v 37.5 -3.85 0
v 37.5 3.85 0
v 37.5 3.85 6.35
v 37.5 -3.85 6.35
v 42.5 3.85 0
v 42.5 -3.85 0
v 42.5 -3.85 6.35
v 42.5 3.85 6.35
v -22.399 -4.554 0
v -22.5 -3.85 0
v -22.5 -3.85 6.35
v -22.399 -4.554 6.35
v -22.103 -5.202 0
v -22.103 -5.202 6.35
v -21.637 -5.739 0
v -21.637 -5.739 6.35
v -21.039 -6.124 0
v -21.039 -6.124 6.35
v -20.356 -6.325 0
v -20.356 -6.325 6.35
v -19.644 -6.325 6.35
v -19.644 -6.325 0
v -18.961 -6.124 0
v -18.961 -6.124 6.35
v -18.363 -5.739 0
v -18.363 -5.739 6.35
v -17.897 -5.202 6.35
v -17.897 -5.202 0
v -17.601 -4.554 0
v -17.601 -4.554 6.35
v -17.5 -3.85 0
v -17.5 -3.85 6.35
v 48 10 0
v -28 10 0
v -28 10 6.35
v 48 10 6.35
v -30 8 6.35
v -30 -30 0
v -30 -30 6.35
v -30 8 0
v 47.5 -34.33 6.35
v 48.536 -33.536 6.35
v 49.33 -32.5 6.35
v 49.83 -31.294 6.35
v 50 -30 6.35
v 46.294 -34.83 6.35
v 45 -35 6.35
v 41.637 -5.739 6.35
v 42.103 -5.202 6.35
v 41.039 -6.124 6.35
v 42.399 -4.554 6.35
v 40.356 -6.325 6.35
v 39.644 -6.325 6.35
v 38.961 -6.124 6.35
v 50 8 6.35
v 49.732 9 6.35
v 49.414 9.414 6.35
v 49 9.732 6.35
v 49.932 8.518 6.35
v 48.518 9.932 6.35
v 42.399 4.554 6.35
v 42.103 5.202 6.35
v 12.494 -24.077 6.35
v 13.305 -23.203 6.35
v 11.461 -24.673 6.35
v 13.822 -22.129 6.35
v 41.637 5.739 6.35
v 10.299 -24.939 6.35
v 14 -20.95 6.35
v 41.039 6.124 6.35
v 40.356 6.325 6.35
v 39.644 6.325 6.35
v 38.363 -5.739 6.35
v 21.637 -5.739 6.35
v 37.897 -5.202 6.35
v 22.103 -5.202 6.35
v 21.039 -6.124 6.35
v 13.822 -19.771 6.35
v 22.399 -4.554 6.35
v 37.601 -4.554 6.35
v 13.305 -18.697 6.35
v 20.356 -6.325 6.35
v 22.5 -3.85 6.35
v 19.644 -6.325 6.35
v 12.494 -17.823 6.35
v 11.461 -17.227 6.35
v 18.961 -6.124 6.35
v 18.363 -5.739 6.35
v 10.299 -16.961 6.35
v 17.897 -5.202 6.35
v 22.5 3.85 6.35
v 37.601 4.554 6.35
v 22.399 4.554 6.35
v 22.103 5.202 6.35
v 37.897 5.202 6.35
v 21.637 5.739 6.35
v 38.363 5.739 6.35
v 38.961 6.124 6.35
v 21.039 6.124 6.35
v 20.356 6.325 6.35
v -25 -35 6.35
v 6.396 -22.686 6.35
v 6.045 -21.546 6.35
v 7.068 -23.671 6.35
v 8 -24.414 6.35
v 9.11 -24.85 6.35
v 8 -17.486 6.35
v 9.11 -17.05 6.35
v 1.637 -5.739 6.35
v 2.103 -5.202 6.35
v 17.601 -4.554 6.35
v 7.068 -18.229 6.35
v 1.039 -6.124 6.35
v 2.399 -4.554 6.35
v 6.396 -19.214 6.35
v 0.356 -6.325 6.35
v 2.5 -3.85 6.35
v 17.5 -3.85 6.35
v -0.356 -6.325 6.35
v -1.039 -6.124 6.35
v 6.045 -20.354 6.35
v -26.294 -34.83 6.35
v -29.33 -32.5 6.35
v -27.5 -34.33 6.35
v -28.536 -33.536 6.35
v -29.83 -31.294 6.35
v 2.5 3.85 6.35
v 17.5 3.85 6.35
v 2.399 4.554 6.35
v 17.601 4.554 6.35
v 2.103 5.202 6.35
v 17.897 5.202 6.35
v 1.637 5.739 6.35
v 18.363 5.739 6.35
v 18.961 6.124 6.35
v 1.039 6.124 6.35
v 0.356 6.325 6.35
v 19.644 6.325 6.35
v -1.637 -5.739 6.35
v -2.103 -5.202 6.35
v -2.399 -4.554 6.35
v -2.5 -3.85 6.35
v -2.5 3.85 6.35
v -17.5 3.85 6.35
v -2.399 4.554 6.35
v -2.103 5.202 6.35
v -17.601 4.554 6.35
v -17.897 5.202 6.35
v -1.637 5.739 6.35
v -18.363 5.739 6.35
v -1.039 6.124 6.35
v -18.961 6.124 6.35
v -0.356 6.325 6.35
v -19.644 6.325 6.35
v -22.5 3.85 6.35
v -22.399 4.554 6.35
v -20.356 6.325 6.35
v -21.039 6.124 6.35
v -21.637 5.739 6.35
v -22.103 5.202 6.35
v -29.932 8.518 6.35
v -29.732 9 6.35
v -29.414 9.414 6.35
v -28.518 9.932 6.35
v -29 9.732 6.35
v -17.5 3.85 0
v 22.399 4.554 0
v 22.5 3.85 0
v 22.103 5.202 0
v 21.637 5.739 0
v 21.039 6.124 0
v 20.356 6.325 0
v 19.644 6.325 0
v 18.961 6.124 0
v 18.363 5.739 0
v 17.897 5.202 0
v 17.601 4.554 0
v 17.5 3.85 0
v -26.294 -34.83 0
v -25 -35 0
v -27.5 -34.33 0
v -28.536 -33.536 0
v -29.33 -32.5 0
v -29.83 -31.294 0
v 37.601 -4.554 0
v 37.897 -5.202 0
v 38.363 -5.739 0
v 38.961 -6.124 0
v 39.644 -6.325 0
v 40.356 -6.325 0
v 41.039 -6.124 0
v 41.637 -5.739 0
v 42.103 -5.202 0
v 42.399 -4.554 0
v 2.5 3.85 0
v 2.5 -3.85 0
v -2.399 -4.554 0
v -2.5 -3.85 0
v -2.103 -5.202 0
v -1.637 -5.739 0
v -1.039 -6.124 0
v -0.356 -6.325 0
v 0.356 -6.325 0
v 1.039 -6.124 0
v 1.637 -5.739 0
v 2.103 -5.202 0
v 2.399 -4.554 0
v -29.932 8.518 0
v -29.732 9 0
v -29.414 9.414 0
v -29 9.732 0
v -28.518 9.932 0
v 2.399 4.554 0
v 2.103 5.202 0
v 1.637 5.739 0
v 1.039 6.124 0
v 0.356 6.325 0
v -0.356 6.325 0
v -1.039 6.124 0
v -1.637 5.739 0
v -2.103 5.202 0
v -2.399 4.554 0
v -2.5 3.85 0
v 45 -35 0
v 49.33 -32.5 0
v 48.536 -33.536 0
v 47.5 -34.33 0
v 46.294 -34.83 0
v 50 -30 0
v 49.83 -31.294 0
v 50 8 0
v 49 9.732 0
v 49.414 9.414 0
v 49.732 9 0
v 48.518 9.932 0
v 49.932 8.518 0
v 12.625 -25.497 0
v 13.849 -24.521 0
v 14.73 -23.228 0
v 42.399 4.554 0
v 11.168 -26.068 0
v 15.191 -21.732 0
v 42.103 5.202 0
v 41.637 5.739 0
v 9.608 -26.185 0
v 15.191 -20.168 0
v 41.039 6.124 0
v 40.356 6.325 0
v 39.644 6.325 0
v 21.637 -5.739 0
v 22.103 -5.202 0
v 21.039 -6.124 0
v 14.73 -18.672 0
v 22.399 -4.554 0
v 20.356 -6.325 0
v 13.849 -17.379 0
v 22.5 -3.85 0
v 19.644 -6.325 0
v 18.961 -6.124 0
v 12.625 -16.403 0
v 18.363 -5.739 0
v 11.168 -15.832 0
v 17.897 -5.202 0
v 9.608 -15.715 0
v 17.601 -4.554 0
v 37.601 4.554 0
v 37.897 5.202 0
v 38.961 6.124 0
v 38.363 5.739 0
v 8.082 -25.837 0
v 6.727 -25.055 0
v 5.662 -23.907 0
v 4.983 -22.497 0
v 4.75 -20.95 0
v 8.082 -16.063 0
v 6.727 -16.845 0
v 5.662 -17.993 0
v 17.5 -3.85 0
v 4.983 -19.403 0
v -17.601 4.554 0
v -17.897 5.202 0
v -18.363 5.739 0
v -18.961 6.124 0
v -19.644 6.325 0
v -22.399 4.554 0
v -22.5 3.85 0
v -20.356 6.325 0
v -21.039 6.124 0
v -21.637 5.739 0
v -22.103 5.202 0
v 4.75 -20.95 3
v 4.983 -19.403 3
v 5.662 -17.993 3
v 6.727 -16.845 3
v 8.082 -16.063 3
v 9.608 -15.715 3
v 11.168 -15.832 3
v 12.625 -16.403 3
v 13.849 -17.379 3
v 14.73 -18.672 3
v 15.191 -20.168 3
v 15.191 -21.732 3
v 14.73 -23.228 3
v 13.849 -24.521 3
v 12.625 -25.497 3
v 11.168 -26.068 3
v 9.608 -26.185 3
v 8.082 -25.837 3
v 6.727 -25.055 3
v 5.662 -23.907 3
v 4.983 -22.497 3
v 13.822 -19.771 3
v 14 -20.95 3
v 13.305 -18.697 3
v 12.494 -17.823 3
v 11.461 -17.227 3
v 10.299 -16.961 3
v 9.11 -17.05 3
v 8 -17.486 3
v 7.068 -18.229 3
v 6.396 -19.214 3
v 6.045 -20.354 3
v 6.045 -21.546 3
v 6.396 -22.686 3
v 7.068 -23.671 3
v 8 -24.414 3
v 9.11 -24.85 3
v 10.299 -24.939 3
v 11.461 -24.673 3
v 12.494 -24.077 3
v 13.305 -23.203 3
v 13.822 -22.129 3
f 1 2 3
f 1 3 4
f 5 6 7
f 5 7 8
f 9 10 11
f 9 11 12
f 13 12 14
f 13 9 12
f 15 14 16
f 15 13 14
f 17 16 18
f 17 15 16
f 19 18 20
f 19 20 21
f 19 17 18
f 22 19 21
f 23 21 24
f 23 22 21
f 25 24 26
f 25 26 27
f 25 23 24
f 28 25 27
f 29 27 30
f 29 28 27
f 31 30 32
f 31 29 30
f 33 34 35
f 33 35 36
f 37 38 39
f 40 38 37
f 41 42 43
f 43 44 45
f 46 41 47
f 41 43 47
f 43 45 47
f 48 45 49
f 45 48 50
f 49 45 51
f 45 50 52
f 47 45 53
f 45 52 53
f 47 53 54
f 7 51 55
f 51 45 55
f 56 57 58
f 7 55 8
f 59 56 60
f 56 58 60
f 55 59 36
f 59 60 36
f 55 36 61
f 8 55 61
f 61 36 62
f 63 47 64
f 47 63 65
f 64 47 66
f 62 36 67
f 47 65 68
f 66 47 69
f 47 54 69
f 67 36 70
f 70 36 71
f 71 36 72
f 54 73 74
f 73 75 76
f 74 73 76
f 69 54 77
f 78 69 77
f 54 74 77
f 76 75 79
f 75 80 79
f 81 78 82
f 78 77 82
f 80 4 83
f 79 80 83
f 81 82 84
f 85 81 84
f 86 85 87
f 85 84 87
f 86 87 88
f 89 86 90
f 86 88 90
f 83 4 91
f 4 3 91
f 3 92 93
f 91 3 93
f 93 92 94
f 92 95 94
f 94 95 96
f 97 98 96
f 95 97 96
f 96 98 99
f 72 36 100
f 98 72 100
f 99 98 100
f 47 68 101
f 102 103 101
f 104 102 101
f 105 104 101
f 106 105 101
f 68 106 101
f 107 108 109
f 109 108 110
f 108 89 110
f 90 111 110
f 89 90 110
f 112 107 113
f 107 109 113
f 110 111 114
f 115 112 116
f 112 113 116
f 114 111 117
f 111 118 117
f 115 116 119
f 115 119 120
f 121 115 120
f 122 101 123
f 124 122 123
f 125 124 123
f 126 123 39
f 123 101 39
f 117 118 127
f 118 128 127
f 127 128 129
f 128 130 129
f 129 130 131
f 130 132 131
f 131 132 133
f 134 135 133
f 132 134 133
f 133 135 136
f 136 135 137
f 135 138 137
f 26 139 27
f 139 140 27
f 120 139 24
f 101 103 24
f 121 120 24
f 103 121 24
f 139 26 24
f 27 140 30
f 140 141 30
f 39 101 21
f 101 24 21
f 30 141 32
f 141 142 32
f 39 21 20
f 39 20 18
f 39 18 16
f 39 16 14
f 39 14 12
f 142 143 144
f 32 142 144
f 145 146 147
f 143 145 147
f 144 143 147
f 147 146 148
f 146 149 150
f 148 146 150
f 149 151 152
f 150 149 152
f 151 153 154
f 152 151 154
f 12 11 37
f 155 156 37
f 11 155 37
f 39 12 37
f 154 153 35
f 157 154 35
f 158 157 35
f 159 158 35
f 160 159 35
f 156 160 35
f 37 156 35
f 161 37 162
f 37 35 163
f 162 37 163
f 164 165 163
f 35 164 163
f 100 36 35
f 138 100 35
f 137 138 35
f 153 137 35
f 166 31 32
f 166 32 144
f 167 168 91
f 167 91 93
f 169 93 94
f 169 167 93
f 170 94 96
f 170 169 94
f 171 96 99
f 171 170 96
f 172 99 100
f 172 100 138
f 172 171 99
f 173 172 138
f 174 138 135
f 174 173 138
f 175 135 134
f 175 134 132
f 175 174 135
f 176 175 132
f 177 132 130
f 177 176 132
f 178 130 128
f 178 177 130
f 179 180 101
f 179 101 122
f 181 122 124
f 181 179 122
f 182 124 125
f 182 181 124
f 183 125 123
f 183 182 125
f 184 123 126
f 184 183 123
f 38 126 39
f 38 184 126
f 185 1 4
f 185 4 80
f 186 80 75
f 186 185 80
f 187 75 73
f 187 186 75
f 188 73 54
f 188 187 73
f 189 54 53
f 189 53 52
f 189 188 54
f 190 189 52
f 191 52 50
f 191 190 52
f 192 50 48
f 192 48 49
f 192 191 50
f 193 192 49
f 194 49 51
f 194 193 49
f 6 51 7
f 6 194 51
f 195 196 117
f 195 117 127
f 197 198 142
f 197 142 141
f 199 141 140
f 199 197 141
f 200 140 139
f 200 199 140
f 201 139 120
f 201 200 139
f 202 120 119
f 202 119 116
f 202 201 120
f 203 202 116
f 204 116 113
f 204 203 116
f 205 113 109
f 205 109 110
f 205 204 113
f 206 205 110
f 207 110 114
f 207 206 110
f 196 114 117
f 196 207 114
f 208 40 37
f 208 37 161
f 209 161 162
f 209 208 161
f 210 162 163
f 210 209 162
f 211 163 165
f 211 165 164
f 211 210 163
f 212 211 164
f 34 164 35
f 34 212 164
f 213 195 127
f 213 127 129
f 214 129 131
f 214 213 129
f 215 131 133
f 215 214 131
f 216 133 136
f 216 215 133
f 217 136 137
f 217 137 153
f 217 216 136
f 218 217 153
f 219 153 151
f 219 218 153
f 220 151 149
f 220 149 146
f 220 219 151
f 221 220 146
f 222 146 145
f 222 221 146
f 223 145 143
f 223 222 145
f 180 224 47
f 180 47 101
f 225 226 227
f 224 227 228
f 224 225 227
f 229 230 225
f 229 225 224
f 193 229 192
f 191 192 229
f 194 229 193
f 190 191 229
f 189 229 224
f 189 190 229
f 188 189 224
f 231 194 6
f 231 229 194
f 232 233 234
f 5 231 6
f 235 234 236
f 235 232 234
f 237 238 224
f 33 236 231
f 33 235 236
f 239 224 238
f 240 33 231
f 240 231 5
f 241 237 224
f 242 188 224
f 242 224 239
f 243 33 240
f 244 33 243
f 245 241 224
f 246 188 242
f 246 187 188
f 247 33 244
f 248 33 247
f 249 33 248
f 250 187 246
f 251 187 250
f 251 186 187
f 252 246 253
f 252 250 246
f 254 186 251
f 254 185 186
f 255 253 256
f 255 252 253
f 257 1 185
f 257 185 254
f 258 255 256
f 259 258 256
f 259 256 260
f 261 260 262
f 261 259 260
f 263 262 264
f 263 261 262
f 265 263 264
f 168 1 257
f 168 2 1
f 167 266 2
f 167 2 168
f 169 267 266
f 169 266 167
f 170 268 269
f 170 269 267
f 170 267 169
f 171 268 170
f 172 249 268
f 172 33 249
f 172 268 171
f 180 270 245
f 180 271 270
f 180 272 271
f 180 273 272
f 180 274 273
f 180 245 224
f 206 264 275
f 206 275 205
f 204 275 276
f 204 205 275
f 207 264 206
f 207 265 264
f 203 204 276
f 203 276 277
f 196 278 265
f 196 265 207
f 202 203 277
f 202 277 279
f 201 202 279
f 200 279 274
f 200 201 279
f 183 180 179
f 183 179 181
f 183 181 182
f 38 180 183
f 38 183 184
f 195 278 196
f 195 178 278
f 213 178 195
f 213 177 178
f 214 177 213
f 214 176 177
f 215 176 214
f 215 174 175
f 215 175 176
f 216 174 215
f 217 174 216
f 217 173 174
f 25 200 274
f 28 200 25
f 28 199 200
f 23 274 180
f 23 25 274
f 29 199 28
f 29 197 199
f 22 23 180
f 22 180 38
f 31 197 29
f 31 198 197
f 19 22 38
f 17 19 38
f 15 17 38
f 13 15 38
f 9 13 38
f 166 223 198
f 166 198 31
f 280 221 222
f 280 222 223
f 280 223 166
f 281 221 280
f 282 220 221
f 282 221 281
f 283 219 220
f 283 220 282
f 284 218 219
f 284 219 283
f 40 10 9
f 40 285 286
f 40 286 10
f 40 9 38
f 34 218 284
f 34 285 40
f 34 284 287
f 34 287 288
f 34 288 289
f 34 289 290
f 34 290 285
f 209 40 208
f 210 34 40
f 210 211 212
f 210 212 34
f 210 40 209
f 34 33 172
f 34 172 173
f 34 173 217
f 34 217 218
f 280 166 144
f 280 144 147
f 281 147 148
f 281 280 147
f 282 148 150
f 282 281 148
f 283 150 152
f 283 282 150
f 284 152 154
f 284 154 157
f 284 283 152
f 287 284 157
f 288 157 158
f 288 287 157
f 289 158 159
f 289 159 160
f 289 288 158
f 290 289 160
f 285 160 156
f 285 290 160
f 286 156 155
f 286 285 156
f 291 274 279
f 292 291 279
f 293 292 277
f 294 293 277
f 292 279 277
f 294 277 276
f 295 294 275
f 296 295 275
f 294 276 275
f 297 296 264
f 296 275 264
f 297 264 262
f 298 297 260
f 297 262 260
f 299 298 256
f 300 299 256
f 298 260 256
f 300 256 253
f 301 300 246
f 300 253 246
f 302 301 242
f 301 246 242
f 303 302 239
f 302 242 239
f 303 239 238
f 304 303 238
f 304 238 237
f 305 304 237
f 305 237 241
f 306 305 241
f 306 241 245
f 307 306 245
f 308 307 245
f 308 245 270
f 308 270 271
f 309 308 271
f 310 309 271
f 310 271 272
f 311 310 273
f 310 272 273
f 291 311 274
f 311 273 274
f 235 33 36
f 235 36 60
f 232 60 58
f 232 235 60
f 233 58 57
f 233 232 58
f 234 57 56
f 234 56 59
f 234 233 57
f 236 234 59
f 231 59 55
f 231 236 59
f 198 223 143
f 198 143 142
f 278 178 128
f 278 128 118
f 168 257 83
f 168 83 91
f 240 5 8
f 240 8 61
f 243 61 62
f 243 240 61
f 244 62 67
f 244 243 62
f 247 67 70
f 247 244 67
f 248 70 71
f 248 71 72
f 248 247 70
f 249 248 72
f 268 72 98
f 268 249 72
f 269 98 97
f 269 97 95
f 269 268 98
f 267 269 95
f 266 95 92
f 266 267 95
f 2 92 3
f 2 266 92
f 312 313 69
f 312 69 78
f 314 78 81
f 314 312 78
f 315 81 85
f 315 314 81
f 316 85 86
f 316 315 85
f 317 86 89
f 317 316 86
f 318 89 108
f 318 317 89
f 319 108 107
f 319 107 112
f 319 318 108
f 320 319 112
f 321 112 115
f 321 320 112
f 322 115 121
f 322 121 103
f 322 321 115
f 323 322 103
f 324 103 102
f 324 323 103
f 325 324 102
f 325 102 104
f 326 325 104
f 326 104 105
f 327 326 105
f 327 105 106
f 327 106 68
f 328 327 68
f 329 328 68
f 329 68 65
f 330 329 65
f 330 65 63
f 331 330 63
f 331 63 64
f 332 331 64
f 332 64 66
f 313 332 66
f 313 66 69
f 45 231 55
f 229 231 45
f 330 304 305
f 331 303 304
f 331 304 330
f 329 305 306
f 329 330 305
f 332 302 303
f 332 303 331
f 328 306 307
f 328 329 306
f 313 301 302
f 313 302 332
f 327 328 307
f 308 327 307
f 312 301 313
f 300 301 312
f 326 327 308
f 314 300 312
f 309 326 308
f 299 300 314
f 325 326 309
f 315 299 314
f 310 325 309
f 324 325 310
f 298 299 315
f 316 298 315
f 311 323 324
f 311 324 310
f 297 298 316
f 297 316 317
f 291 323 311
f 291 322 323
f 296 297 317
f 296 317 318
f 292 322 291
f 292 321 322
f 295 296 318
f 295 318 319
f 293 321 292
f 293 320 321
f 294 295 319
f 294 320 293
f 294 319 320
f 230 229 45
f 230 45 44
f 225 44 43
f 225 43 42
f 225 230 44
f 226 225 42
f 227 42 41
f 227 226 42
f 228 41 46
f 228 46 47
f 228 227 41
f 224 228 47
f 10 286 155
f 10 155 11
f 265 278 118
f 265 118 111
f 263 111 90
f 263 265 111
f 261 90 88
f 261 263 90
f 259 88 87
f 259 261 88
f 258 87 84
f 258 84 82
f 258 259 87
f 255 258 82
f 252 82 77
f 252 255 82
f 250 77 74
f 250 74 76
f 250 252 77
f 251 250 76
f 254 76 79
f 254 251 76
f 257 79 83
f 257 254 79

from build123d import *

# Parameters (mm, degrees)
SKETCH1_R                 = 4
BOSS_EXTRUDE1_DEPTH       = 6.35
F_5_0MM_DOWEL_SLOT1_DEPTH = 6.35
SKETCH5_R                 = 5.25
CUT_EXTRUDE1_DEPTH        = 3


# Read off the part's stored shape, not the designer's step: Ø5.0mm Dowel Slot1
with BuildPart() as part:
    # Sketch1 → Boss-Extrude1 (new body)
    with BuildSketch(Plane.XY):
        with BuildLine():
            Line((-27.999999098, 10), (48.000000902, 10))
            ThreePointArc((48.000000902, 10), (49.414214465, 9.414213562), (50.000000902, 8))
            Line((50.000000902, 8), (50.000000902, -30))
            ThreePointArc((50.000000902, -30), (48.535534808, -33.535533906), (45.000000902, -35))
            Line((45.000000902, -35), (-24.999999098, -35))
            ThreePointArc((-24.999999098, -35), (-28.535533003, -33.535533906), (-29.999999098, -30))
            Line((-29.999999098, -30), (-29.999999098, 8))
            ThreePointArc((-29.999999098, 8), (-29.41421266, 9.414213562), (-27.999999098, 10))
        make_face()
        with Locations((10.000000902, -20.95)):
            Circle(SKETCH1_R, mode=Mode.SUBTRACT)
    extrude(amount=BOSS_EXTRUDE1_DEPTH)

    # Ø5.0mm Dowel Slot1 outline → Ø5.0mm Dowel Slot1 (cut)
    with BuildSketch(Plane.XY):
        with BuildLine():
            Line((22.500000902, -3.85), (22.500000902, 3.85))
            ThreePointArc((22.500000902, 3.85), (20.000000902, 6.35), (17.500000902, 3.85))
            Line((17.500000902, 3.85), (17.500000902, -3.85))
            ThreePointArc((17.500000902, -3.85), (20.000000902, -6.35), (22.500000902, -3.85))
        make_face()
        with BuildLine():
            Line((-17.499999098, -3.85), (-17.499999098, 3.85))
            ThreePointArc((-17.499999098, 3.85), (-19.999999098, 6.35), (-22.499999098, 3.85))
            Line((-22.499999098, 3.85), (-22.499999098, -3.85))
            ThreePointArc((-22.499999098, -3.85), (-19.999999098, -6.35), (-17.499999098, -3.85))
        make_face()
        with BuildLine():
            Line((2.500000902, -3.85), (2.500000902, 3.85))
            ThreePointArc((2.500000902, 3.85), (9.02e-07, 6.35), (-2.499999098, 3.85))
            Line((-2.499999098, 3.85), (-2.499999098, -3.85))
            ThreePointArc((-2.499999098, -3.85), (9.02e-07, -6.35), (2.500000902, -3.85))
        make_face()
        with BuildLine():
            Line((42.500000902, -3.85), (42.500000902, 3.85))
            ThreePointArc((42.500000902, 3.85), (40.000000902, 6.35), (37.500000902, 3.85))
            Line((37.500000902, 3.85), (37.500000902, -3.85))
            ThreePointArc((37.500000902, -3.85), (40.000000902, -6.35), (42.500000902, -3.85))
        make_face()
    extrude(amount=F_5_0MM_DOWEL_SLOT1_DEPTH, mode=Mode.SUBTRACT)

    # Sketch5 → Cut-Extrude1 (cut)
    with BuildSketch(Plane(origin=(0, 0, 0), x_dir=(-1, 0, 0), z_dir=(0, 0, -1))):
        with Locations((-10.000000902, -20.95)):
            Circle(SKETCH5_R)
    extrude(amount=-CUT_EXTRUDE1_DEPTH, mode=Mode.SUBTRACT)


solid = part.part
